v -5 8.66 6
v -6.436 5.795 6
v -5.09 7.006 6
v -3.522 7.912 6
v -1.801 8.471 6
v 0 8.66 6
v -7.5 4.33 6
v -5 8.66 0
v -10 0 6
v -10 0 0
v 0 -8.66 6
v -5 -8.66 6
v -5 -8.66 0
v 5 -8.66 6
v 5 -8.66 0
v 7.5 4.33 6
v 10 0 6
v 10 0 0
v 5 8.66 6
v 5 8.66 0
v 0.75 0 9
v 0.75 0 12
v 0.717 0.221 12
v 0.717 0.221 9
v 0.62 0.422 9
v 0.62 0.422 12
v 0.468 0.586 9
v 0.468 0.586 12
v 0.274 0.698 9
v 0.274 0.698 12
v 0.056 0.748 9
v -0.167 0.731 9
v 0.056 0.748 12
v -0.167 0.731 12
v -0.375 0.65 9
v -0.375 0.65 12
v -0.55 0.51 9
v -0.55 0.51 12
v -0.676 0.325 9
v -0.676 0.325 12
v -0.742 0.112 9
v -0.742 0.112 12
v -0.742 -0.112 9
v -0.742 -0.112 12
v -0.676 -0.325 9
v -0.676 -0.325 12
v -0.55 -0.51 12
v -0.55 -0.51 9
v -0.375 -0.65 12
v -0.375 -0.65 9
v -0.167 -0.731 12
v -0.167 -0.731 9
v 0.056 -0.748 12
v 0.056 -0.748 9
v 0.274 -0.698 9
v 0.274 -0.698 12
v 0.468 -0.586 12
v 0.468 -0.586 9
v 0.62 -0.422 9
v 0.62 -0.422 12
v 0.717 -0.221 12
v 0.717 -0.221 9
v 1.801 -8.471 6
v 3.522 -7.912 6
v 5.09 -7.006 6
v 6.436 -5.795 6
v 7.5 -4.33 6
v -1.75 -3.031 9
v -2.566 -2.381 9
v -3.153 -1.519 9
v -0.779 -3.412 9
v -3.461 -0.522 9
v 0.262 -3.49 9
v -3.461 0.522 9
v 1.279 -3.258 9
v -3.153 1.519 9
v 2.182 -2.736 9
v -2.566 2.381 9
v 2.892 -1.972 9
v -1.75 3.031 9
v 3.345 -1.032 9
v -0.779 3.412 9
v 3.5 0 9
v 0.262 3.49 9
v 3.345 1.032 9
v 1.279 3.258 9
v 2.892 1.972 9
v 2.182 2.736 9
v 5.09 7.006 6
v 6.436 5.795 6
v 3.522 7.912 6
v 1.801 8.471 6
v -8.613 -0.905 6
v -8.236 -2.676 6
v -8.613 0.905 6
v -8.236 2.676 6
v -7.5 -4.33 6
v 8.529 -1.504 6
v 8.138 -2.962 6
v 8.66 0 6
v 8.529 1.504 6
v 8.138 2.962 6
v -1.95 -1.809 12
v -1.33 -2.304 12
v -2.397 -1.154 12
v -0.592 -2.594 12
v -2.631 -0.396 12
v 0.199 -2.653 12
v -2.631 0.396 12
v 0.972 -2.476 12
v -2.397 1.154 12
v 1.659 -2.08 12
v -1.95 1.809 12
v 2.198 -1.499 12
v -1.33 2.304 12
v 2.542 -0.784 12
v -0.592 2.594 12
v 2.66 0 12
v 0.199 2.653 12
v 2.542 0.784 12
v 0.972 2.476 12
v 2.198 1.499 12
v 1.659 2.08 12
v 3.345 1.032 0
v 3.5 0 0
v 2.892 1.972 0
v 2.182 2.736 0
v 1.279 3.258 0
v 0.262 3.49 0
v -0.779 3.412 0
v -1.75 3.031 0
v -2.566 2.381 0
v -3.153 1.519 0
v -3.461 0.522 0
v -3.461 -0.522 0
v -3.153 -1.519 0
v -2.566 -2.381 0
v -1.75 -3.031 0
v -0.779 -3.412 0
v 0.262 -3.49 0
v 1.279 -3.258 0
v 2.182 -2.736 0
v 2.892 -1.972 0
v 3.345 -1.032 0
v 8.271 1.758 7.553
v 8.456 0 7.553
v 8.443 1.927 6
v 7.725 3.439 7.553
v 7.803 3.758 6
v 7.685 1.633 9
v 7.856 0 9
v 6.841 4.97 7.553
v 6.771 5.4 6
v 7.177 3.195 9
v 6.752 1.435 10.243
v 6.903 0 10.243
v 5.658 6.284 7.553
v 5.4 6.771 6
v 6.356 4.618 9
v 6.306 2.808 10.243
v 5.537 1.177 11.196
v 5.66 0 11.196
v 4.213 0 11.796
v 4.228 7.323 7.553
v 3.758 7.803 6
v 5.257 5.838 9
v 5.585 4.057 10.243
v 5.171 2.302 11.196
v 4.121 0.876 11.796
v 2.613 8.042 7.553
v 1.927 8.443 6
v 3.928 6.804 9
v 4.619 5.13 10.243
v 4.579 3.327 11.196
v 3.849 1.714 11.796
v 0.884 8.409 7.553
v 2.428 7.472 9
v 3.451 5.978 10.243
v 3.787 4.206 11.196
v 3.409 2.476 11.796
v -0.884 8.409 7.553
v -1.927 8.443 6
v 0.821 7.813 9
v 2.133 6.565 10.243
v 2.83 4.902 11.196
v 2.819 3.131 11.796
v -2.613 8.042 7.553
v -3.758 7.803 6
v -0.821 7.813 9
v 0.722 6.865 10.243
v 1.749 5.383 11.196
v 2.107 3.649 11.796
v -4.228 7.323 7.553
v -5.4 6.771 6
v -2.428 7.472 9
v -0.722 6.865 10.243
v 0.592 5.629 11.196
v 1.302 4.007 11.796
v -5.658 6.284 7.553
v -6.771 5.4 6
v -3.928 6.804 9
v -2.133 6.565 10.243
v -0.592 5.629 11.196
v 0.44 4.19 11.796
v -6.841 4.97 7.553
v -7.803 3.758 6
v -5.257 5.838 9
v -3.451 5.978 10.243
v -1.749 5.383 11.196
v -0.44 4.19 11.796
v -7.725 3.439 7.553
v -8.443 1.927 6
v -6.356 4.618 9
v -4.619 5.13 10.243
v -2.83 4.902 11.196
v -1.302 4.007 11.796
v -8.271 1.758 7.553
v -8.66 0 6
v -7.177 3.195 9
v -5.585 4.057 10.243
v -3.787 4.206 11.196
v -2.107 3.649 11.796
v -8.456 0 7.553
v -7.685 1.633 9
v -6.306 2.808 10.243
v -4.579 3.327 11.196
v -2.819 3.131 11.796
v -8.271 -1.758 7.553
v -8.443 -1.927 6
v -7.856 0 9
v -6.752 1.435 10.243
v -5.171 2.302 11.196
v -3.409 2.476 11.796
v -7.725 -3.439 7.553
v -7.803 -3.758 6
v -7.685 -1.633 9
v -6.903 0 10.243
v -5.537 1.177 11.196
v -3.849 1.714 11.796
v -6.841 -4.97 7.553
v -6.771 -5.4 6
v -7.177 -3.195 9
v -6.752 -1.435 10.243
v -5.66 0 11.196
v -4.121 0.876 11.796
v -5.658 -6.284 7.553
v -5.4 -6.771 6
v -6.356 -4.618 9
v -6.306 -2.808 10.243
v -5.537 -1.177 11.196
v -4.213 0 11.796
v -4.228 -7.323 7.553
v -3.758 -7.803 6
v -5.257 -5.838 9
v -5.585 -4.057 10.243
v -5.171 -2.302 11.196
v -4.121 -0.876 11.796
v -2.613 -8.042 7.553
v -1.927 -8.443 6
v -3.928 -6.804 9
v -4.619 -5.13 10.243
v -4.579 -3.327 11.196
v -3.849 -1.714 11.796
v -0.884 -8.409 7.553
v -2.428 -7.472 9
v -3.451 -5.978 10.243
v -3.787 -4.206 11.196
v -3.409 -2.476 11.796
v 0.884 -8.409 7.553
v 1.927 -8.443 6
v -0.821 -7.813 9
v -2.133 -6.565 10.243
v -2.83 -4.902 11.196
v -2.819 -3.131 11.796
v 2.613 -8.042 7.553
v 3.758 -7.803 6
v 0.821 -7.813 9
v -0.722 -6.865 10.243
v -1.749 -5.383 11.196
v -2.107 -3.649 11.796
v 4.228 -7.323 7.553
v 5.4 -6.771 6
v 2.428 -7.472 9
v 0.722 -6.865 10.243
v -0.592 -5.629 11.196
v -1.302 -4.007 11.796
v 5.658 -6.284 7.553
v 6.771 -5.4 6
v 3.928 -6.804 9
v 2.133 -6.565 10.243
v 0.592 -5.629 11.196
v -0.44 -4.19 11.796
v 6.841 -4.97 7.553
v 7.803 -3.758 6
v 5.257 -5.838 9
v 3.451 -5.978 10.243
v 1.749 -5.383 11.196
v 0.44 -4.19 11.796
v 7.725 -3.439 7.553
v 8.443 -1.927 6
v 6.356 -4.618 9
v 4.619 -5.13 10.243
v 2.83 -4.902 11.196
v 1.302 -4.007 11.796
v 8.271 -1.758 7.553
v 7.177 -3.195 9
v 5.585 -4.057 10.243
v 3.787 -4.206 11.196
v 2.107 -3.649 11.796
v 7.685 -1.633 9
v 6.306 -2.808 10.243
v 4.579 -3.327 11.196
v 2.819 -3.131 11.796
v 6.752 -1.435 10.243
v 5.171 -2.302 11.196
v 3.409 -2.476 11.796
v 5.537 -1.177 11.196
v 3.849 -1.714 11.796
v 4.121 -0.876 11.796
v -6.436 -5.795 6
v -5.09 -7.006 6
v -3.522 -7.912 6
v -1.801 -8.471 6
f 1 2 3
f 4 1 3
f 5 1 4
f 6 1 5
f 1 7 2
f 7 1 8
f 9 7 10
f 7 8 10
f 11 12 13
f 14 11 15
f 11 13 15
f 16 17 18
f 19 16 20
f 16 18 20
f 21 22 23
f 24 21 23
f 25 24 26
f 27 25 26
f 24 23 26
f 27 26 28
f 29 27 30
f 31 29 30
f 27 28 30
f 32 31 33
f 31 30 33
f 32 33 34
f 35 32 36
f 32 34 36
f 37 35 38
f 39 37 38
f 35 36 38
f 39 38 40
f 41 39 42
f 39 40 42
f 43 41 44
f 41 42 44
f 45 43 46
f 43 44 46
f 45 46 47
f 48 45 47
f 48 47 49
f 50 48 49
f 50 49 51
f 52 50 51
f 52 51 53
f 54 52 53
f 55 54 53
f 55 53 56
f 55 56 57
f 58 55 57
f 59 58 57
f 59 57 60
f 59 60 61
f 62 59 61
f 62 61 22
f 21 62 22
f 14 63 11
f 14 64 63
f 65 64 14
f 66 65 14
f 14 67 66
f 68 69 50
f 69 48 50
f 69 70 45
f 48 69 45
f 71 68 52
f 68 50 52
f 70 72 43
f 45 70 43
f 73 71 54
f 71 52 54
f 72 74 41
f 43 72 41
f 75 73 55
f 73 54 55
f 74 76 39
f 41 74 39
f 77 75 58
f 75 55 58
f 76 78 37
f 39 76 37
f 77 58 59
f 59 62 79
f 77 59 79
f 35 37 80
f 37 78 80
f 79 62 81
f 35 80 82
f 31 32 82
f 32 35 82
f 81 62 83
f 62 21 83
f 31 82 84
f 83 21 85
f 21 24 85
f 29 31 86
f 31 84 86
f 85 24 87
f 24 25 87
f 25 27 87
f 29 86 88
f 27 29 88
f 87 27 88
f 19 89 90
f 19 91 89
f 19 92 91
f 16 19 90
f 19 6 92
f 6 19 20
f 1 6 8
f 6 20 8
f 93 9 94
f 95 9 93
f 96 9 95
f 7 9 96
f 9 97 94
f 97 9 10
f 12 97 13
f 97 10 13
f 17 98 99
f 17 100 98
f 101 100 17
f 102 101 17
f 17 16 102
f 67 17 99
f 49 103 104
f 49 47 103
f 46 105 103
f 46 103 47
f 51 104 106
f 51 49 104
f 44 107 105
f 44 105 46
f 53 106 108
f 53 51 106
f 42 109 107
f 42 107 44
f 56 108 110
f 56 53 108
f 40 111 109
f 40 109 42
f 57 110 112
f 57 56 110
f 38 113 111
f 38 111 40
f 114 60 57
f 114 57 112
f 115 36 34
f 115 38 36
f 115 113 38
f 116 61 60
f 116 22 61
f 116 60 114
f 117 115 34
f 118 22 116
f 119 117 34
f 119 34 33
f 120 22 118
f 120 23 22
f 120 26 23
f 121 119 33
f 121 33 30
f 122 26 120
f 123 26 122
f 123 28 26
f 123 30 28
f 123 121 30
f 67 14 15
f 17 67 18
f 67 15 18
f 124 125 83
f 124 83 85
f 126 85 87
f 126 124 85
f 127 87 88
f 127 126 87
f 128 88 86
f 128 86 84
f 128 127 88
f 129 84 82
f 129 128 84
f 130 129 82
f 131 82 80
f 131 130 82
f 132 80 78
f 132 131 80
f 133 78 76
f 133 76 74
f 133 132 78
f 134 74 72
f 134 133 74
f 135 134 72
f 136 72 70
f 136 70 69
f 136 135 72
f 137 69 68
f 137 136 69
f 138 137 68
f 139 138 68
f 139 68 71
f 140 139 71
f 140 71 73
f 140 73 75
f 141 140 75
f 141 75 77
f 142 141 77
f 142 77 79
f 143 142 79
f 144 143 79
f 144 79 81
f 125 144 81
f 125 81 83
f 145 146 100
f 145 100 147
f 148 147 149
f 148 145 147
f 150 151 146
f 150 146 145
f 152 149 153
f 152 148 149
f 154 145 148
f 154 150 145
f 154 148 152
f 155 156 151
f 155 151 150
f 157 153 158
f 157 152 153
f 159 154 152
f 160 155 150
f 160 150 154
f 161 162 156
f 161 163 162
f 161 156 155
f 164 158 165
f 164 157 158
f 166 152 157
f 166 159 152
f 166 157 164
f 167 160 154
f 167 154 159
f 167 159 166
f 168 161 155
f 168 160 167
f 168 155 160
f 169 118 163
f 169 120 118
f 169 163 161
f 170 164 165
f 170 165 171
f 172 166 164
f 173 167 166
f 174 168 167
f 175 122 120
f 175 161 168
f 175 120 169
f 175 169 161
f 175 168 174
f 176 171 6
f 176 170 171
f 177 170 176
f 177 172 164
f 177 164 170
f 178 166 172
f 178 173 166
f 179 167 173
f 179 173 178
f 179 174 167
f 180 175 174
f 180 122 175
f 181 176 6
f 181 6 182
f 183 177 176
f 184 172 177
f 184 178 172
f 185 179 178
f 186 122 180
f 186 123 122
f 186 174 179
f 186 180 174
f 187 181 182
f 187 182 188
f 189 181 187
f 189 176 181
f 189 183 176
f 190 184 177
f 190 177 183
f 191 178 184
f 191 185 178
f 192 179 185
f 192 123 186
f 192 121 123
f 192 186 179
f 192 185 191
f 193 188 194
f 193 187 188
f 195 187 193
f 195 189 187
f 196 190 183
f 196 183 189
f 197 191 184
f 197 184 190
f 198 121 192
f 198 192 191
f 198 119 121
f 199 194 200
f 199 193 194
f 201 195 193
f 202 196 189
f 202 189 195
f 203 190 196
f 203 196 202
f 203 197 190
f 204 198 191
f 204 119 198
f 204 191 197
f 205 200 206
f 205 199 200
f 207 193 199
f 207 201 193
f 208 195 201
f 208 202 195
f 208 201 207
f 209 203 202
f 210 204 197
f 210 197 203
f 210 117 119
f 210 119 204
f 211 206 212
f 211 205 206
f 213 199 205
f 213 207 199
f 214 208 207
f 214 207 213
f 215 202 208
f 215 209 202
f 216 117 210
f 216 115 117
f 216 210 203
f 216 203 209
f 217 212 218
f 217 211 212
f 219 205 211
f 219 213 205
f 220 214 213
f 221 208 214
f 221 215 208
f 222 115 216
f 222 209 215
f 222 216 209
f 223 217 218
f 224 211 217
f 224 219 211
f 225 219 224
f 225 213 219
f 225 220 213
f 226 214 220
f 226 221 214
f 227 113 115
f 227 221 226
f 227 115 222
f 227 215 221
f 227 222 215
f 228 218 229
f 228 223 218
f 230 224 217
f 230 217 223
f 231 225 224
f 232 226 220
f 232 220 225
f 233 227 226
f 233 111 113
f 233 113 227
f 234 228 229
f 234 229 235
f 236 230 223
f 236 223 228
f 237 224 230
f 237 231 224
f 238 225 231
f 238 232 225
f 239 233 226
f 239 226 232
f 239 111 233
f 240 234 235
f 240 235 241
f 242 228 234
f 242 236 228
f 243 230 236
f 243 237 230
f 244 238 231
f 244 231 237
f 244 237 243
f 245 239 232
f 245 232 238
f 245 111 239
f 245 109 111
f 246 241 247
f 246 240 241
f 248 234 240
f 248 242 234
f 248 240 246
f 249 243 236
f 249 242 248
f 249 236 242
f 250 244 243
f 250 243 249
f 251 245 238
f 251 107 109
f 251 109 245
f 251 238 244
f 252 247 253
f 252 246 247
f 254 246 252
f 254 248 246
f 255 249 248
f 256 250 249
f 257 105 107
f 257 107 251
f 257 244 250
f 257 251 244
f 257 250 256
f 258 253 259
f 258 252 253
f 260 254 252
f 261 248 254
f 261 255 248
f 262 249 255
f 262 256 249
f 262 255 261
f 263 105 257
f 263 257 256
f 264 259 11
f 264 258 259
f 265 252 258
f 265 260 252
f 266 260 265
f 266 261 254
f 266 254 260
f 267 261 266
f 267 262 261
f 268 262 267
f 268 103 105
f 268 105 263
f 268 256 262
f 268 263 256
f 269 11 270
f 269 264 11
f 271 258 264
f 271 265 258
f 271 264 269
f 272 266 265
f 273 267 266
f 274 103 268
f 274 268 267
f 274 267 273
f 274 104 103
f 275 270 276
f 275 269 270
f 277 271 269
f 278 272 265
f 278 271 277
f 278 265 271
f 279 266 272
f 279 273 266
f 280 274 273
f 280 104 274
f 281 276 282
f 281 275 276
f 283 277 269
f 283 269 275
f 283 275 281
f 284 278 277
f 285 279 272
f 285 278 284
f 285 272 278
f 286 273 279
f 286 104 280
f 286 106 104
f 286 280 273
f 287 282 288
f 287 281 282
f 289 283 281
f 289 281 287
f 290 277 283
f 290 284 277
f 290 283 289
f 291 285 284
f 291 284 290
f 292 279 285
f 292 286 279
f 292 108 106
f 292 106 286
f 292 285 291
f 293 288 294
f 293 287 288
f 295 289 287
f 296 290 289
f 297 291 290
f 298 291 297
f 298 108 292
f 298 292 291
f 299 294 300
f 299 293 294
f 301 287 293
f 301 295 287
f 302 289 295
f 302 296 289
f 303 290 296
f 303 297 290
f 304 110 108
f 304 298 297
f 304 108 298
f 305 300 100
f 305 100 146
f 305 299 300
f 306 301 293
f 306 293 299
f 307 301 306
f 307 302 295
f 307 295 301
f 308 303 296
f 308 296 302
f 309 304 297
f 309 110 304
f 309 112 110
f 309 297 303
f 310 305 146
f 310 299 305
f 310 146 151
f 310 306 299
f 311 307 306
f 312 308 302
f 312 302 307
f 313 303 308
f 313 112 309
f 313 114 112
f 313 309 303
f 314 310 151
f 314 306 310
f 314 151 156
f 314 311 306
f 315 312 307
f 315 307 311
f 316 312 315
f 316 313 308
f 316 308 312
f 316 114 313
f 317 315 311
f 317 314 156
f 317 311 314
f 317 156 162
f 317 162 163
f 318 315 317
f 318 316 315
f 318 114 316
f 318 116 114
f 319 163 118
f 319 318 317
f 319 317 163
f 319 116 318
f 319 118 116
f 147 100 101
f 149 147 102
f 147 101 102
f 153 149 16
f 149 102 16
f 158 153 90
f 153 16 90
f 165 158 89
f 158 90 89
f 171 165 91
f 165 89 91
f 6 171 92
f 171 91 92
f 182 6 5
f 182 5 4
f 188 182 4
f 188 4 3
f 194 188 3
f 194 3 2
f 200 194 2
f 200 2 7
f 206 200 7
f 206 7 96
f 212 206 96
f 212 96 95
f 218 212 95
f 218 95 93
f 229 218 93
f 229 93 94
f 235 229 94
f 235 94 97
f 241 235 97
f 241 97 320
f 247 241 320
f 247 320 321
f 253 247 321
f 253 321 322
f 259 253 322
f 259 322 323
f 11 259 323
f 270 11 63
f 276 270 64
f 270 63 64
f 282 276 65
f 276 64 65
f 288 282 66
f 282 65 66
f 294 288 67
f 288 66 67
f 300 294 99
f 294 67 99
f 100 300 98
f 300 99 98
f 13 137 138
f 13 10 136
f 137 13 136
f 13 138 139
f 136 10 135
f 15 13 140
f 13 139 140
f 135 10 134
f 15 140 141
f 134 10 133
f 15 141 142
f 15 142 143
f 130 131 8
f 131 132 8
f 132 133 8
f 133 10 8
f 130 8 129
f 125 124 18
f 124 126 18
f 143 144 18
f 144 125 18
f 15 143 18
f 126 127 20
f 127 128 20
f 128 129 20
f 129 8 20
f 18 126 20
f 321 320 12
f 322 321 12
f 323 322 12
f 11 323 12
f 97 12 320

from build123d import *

# Parameters (mm, degrees)
F0_R     = 3.5
F1_DEPTH = 6
F2_R     = 8.6602540378
F3_DEPTH = 6
F4_R     = 5.99999
F6_DEPTH = 3
F5_R     = 0.75
F7_DEPTH = 12.001


# Not quite as in the source:
# - a fillet or chamfer is up to 0.001 mm smaller than in the source, because OpenCascade refuses the exact size


with BuildPart() as f1:
    # F0 (on Top) → F1 (new body)
    with BuildSketch(Plane.XY):
        Polygon((5, 8.6602540378), (-5, 8.6602540378), (-10, 0), (-5, -8.6602540378), (5, -8.6602540378), (10, 0), align=None)
        Circle(F0_R, mode=Mode.SUBTRACT)
    extrude(amount=F1_DEPTH)

    # F2 (on face) → F3 (join)
    with BuildSketch(Plane.XY.offset(6)):
        Circle(F2_R)
    extrude(amount=F3_DEPTH)

    # F4 (radius 6 in the source; OpenCascade refuses exactly that, so slightly less here)
    f4_edges = [f1.edges().sort_by_distance(p)[0] for p in [
        (-8.660254, 0, 12),
    ]]
    fillet(f4_edges, radius=F4_R)

    # F6 (cut): a face of the model
    f6_faces = [f1.faces().sort_by_distance(p)[0] for p in [
        (0, 0, 6),
    ]]
    extrude(f6_faces, amount=-F6_DEPTH, mode=Mode.SUBTRACT)

    # F5 (on face) → F7 (cut, through all)
    with BuildSketch(Plane.XY.offset(12)):
        Circle(F5_R)
    extrude(amount=-F7_DEPTH, mode=Mode.SUBTRACT)


solid = f1.part
